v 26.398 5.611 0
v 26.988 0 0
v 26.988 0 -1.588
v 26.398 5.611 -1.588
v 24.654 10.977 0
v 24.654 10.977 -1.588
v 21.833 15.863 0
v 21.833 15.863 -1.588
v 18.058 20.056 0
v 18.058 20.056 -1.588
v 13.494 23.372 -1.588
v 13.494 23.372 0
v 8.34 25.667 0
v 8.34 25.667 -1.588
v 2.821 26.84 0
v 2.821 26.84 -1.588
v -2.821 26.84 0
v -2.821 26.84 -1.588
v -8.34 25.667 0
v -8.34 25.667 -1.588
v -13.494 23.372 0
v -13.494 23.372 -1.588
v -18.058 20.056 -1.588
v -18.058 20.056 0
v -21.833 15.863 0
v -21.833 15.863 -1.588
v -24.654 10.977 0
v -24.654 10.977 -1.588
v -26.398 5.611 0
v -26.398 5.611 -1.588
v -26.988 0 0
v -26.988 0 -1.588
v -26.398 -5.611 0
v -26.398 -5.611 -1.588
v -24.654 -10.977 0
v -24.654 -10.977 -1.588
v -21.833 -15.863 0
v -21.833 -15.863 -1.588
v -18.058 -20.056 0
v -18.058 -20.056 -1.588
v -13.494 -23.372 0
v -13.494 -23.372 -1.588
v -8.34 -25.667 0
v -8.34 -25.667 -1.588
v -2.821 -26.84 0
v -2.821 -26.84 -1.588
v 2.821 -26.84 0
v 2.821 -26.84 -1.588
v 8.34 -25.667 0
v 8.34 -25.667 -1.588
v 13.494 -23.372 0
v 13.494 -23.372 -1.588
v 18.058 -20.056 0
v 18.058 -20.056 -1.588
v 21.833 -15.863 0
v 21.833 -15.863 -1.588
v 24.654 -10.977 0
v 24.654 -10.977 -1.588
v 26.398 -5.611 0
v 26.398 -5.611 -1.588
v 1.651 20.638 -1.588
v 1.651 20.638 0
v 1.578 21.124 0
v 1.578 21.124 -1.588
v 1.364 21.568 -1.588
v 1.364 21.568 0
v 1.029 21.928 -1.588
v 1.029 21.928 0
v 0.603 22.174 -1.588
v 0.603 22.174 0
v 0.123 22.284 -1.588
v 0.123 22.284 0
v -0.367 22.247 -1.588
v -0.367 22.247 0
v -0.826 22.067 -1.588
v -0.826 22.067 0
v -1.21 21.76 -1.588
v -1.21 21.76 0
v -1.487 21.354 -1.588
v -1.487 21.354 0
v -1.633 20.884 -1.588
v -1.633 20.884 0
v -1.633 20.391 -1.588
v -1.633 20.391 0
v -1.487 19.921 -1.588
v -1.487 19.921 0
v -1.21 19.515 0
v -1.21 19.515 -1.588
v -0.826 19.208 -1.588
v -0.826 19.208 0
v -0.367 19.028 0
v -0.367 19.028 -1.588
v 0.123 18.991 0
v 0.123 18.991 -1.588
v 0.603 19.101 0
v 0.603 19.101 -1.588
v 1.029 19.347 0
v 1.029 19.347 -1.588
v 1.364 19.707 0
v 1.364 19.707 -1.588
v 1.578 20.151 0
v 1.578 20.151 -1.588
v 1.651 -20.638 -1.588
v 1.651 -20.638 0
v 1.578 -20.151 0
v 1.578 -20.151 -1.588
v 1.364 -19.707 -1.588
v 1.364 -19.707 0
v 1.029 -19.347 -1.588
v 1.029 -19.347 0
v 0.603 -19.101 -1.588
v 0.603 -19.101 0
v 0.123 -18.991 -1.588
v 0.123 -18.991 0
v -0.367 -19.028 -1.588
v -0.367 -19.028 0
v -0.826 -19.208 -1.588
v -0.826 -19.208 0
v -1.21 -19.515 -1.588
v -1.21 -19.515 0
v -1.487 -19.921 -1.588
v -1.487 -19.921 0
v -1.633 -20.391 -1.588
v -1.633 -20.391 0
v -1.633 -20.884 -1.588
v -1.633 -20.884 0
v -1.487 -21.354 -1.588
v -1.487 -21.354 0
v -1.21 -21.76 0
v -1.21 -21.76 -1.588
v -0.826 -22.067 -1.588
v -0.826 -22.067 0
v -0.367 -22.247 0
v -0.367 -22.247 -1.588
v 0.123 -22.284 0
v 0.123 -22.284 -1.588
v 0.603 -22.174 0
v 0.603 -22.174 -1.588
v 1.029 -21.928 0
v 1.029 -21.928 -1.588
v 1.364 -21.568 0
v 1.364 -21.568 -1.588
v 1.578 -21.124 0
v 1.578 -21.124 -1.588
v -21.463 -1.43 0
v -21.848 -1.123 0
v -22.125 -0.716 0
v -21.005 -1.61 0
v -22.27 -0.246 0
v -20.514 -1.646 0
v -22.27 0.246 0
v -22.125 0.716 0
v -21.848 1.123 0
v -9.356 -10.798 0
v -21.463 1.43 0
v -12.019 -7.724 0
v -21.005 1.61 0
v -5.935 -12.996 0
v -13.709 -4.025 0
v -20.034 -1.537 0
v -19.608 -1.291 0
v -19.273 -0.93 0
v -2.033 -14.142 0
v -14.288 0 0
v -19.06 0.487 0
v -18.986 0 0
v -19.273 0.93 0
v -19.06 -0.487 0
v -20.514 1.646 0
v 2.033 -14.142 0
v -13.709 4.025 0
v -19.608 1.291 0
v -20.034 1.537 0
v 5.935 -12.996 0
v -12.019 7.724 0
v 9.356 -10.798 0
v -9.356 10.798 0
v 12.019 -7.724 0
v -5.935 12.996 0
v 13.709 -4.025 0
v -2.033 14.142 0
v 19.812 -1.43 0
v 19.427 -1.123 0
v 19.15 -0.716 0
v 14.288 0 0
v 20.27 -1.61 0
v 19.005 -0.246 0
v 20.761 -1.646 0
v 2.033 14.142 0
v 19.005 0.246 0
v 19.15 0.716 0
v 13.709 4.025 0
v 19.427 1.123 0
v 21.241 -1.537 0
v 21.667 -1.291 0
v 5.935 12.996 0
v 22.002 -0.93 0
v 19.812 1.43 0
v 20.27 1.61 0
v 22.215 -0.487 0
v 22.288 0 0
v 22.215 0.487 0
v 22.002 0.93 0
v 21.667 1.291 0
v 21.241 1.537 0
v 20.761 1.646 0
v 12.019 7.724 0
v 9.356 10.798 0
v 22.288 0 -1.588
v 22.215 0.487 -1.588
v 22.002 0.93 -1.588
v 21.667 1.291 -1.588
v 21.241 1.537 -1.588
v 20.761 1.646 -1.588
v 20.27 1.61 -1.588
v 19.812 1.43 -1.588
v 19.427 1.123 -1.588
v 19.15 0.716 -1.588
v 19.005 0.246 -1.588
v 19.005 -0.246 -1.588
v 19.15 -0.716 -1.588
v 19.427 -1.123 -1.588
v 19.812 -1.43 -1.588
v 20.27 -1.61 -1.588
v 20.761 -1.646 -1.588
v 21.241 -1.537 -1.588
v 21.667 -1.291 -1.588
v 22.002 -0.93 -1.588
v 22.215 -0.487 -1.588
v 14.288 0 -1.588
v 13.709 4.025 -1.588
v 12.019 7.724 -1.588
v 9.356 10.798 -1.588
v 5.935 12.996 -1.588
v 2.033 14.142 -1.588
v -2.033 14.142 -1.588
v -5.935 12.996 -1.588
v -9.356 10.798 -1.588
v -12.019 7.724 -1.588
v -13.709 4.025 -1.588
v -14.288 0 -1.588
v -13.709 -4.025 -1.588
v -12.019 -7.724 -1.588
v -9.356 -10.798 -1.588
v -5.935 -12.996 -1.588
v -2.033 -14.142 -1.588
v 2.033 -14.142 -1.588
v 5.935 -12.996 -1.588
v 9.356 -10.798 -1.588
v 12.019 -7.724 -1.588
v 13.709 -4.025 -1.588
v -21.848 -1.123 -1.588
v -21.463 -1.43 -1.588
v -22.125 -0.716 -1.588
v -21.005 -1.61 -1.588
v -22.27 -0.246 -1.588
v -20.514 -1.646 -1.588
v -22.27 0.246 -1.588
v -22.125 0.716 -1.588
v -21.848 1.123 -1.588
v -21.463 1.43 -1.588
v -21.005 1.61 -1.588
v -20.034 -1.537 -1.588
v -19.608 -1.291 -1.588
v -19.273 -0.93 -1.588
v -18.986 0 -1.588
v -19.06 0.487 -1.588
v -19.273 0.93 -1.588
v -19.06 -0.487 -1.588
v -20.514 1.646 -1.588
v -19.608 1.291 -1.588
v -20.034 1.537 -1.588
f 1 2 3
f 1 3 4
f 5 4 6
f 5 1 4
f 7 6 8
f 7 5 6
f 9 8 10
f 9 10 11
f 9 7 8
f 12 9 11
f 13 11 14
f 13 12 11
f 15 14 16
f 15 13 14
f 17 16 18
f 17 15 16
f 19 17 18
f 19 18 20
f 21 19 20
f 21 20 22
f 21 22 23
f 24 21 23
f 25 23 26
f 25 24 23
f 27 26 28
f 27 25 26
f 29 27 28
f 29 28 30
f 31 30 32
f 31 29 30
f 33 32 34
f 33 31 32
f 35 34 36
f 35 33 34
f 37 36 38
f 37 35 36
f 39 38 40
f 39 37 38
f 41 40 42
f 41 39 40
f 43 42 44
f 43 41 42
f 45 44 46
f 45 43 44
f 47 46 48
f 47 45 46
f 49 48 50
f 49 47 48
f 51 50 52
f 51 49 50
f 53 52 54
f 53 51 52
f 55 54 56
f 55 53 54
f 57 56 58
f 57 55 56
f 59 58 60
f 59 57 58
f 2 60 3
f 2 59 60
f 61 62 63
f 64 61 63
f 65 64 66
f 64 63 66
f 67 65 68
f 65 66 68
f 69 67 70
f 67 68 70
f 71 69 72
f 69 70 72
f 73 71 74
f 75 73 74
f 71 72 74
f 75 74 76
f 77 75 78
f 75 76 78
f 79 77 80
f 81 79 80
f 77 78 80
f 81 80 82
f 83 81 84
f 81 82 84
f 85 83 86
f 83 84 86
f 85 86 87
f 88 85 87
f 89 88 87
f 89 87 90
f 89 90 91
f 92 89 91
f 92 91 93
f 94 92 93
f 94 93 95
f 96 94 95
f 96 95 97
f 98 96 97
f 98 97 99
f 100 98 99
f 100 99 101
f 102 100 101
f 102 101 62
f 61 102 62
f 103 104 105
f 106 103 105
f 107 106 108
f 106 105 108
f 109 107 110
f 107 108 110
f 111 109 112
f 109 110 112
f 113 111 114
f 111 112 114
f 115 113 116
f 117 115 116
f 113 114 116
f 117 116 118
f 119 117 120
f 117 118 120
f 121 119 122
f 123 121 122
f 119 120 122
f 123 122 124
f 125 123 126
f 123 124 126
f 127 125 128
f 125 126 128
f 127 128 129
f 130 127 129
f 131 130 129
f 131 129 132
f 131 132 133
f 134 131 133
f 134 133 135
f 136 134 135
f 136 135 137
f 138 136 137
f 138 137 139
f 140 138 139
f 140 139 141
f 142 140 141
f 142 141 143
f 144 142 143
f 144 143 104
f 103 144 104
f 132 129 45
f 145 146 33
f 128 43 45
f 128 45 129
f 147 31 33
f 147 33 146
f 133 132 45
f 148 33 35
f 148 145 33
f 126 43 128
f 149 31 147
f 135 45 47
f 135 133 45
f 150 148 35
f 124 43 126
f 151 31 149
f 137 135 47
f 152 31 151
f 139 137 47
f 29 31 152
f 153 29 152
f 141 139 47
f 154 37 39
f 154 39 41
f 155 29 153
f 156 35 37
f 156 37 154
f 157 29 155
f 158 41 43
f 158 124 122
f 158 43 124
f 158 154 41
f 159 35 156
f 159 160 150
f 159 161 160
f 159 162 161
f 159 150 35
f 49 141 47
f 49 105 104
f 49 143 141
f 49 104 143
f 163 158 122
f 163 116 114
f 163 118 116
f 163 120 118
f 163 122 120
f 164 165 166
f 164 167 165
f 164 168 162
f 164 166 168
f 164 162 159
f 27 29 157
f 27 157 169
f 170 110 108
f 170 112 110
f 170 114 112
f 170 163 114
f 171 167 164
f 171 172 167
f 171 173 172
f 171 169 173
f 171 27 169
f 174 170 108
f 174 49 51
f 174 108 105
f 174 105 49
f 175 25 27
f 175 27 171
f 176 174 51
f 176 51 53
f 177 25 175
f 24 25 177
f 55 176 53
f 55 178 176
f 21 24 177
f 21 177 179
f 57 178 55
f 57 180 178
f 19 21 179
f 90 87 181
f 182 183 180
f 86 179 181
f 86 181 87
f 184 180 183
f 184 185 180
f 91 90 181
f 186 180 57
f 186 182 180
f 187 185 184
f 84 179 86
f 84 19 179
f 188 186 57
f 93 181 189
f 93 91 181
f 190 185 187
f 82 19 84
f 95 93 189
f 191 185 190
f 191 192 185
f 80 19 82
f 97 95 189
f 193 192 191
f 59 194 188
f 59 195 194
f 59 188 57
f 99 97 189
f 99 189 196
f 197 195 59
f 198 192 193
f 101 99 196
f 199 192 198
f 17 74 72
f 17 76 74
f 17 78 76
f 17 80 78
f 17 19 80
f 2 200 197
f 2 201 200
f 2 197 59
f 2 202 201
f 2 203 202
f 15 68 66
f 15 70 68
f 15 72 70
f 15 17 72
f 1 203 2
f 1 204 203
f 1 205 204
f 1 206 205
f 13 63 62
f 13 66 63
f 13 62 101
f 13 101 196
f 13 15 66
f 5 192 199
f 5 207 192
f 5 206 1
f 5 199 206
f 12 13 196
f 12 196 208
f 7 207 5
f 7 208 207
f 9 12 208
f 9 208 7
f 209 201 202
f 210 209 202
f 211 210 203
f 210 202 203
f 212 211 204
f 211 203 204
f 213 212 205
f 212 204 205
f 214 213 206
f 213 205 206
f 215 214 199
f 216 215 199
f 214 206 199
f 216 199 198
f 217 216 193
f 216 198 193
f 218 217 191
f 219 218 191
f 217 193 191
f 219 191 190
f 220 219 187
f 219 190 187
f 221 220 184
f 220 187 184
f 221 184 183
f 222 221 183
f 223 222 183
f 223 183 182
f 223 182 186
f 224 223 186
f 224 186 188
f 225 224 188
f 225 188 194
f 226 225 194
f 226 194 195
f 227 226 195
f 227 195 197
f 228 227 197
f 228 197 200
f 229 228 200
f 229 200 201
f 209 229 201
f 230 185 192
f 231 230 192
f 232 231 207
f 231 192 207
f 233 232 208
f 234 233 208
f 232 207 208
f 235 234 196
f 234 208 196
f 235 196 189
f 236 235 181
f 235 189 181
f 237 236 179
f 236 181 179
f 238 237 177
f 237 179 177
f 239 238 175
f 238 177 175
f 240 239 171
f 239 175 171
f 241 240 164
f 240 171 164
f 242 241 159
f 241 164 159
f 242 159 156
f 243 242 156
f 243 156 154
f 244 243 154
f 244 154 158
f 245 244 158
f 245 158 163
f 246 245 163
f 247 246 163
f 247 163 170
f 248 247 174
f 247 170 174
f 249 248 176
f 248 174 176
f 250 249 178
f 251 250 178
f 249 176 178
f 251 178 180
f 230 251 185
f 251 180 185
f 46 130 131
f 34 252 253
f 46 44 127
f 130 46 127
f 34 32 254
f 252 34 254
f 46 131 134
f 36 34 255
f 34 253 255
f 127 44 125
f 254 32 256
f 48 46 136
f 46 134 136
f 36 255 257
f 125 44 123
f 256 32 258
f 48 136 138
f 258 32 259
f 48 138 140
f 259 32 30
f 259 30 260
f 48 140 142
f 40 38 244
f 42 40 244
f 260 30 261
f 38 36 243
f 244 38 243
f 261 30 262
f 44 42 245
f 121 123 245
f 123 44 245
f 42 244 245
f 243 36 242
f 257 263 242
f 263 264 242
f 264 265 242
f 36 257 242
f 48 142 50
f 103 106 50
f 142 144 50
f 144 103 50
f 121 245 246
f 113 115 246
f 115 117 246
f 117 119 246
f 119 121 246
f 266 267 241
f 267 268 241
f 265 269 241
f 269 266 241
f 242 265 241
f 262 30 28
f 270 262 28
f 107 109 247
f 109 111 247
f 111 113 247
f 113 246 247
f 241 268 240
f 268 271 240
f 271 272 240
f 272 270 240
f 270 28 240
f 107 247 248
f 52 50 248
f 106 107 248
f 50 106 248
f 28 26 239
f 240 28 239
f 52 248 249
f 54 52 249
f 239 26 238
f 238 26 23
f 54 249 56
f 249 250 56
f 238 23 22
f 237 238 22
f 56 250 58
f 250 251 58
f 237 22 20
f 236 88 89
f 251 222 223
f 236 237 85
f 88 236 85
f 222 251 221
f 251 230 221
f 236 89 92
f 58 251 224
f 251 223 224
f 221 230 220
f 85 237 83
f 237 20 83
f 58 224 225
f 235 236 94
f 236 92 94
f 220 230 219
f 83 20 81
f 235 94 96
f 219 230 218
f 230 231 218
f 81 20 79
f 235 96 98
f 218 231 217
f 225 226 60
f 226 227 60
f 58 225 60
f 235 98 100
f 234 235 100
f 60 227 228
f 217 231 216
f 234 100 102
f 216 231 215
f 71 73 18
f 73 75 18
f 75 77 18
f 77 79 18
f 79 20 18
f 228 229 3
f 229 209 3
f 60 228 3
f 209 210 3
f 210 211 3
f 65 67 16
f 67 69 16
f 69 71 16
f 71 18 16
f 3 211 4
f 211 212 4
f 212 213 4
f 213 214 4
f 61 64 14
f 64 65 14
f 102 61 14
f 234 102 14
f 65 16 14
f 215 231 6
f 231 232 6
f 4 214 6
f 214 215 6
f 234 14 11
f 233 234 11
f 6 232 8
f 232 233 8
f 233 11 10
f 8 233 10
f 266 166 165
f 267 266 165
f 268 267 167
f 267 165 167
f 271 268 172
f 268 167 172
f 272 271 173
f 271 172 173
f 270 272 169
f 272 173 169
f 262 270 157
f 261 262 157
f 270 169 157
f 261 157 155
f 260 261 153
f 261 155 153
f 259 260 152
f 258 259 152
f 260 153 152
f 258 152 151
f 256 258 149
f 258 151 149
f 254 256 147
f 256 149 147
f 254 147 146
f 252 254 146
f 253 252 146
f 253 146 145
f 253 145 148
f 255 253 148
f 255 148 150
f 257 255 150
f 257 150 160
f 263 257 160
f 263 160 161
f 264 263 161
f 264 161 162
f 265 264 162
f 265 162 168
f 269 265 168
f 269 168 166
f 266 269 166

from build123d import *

# Parameters (mm, degrees)
SKETCH1_R          = 26.9875
SKETCH1_R_2        = 14.2875
BASE_FLANGE1_DEPTH = 1.5875
SKETCH6_R          = 1.651
CUT_EXTRUDE1_DEPTH = 39.199089894


# Sheet-metal steps are written as plain solids
with BuildPart() as part:
    # Sketch1 → Base-Flange1 (new body)
    with BuildSketch(Plane.XY):
        Circle(SKETCH1_R)
        Circle(SKETCH1_R_2, mode=Mode.SUBTRACT)
    extrude(amount=-BASE_FLANGE1_DEPTH)

    # Sketch6 → Cut-Extrude1 (cut, through all)
    with BuildSketch(Plane.XY):
        with Locations((0, 20.6375)):
            Circle(SKETCH6_R)
        with Locations((20.6375, 0)):
            Circle(SKETCH6_R)
        with Locations((0, -20.6375)):
            Circle(SKETCH6_R)
        with Locations((-20.6375, 0)):
            Circle(SKETCH6_R)
    extrude(amount=-CUT_EXTRUDE1_DEPTH, mode=Mode.SUBTRACT)


solid = part.part
